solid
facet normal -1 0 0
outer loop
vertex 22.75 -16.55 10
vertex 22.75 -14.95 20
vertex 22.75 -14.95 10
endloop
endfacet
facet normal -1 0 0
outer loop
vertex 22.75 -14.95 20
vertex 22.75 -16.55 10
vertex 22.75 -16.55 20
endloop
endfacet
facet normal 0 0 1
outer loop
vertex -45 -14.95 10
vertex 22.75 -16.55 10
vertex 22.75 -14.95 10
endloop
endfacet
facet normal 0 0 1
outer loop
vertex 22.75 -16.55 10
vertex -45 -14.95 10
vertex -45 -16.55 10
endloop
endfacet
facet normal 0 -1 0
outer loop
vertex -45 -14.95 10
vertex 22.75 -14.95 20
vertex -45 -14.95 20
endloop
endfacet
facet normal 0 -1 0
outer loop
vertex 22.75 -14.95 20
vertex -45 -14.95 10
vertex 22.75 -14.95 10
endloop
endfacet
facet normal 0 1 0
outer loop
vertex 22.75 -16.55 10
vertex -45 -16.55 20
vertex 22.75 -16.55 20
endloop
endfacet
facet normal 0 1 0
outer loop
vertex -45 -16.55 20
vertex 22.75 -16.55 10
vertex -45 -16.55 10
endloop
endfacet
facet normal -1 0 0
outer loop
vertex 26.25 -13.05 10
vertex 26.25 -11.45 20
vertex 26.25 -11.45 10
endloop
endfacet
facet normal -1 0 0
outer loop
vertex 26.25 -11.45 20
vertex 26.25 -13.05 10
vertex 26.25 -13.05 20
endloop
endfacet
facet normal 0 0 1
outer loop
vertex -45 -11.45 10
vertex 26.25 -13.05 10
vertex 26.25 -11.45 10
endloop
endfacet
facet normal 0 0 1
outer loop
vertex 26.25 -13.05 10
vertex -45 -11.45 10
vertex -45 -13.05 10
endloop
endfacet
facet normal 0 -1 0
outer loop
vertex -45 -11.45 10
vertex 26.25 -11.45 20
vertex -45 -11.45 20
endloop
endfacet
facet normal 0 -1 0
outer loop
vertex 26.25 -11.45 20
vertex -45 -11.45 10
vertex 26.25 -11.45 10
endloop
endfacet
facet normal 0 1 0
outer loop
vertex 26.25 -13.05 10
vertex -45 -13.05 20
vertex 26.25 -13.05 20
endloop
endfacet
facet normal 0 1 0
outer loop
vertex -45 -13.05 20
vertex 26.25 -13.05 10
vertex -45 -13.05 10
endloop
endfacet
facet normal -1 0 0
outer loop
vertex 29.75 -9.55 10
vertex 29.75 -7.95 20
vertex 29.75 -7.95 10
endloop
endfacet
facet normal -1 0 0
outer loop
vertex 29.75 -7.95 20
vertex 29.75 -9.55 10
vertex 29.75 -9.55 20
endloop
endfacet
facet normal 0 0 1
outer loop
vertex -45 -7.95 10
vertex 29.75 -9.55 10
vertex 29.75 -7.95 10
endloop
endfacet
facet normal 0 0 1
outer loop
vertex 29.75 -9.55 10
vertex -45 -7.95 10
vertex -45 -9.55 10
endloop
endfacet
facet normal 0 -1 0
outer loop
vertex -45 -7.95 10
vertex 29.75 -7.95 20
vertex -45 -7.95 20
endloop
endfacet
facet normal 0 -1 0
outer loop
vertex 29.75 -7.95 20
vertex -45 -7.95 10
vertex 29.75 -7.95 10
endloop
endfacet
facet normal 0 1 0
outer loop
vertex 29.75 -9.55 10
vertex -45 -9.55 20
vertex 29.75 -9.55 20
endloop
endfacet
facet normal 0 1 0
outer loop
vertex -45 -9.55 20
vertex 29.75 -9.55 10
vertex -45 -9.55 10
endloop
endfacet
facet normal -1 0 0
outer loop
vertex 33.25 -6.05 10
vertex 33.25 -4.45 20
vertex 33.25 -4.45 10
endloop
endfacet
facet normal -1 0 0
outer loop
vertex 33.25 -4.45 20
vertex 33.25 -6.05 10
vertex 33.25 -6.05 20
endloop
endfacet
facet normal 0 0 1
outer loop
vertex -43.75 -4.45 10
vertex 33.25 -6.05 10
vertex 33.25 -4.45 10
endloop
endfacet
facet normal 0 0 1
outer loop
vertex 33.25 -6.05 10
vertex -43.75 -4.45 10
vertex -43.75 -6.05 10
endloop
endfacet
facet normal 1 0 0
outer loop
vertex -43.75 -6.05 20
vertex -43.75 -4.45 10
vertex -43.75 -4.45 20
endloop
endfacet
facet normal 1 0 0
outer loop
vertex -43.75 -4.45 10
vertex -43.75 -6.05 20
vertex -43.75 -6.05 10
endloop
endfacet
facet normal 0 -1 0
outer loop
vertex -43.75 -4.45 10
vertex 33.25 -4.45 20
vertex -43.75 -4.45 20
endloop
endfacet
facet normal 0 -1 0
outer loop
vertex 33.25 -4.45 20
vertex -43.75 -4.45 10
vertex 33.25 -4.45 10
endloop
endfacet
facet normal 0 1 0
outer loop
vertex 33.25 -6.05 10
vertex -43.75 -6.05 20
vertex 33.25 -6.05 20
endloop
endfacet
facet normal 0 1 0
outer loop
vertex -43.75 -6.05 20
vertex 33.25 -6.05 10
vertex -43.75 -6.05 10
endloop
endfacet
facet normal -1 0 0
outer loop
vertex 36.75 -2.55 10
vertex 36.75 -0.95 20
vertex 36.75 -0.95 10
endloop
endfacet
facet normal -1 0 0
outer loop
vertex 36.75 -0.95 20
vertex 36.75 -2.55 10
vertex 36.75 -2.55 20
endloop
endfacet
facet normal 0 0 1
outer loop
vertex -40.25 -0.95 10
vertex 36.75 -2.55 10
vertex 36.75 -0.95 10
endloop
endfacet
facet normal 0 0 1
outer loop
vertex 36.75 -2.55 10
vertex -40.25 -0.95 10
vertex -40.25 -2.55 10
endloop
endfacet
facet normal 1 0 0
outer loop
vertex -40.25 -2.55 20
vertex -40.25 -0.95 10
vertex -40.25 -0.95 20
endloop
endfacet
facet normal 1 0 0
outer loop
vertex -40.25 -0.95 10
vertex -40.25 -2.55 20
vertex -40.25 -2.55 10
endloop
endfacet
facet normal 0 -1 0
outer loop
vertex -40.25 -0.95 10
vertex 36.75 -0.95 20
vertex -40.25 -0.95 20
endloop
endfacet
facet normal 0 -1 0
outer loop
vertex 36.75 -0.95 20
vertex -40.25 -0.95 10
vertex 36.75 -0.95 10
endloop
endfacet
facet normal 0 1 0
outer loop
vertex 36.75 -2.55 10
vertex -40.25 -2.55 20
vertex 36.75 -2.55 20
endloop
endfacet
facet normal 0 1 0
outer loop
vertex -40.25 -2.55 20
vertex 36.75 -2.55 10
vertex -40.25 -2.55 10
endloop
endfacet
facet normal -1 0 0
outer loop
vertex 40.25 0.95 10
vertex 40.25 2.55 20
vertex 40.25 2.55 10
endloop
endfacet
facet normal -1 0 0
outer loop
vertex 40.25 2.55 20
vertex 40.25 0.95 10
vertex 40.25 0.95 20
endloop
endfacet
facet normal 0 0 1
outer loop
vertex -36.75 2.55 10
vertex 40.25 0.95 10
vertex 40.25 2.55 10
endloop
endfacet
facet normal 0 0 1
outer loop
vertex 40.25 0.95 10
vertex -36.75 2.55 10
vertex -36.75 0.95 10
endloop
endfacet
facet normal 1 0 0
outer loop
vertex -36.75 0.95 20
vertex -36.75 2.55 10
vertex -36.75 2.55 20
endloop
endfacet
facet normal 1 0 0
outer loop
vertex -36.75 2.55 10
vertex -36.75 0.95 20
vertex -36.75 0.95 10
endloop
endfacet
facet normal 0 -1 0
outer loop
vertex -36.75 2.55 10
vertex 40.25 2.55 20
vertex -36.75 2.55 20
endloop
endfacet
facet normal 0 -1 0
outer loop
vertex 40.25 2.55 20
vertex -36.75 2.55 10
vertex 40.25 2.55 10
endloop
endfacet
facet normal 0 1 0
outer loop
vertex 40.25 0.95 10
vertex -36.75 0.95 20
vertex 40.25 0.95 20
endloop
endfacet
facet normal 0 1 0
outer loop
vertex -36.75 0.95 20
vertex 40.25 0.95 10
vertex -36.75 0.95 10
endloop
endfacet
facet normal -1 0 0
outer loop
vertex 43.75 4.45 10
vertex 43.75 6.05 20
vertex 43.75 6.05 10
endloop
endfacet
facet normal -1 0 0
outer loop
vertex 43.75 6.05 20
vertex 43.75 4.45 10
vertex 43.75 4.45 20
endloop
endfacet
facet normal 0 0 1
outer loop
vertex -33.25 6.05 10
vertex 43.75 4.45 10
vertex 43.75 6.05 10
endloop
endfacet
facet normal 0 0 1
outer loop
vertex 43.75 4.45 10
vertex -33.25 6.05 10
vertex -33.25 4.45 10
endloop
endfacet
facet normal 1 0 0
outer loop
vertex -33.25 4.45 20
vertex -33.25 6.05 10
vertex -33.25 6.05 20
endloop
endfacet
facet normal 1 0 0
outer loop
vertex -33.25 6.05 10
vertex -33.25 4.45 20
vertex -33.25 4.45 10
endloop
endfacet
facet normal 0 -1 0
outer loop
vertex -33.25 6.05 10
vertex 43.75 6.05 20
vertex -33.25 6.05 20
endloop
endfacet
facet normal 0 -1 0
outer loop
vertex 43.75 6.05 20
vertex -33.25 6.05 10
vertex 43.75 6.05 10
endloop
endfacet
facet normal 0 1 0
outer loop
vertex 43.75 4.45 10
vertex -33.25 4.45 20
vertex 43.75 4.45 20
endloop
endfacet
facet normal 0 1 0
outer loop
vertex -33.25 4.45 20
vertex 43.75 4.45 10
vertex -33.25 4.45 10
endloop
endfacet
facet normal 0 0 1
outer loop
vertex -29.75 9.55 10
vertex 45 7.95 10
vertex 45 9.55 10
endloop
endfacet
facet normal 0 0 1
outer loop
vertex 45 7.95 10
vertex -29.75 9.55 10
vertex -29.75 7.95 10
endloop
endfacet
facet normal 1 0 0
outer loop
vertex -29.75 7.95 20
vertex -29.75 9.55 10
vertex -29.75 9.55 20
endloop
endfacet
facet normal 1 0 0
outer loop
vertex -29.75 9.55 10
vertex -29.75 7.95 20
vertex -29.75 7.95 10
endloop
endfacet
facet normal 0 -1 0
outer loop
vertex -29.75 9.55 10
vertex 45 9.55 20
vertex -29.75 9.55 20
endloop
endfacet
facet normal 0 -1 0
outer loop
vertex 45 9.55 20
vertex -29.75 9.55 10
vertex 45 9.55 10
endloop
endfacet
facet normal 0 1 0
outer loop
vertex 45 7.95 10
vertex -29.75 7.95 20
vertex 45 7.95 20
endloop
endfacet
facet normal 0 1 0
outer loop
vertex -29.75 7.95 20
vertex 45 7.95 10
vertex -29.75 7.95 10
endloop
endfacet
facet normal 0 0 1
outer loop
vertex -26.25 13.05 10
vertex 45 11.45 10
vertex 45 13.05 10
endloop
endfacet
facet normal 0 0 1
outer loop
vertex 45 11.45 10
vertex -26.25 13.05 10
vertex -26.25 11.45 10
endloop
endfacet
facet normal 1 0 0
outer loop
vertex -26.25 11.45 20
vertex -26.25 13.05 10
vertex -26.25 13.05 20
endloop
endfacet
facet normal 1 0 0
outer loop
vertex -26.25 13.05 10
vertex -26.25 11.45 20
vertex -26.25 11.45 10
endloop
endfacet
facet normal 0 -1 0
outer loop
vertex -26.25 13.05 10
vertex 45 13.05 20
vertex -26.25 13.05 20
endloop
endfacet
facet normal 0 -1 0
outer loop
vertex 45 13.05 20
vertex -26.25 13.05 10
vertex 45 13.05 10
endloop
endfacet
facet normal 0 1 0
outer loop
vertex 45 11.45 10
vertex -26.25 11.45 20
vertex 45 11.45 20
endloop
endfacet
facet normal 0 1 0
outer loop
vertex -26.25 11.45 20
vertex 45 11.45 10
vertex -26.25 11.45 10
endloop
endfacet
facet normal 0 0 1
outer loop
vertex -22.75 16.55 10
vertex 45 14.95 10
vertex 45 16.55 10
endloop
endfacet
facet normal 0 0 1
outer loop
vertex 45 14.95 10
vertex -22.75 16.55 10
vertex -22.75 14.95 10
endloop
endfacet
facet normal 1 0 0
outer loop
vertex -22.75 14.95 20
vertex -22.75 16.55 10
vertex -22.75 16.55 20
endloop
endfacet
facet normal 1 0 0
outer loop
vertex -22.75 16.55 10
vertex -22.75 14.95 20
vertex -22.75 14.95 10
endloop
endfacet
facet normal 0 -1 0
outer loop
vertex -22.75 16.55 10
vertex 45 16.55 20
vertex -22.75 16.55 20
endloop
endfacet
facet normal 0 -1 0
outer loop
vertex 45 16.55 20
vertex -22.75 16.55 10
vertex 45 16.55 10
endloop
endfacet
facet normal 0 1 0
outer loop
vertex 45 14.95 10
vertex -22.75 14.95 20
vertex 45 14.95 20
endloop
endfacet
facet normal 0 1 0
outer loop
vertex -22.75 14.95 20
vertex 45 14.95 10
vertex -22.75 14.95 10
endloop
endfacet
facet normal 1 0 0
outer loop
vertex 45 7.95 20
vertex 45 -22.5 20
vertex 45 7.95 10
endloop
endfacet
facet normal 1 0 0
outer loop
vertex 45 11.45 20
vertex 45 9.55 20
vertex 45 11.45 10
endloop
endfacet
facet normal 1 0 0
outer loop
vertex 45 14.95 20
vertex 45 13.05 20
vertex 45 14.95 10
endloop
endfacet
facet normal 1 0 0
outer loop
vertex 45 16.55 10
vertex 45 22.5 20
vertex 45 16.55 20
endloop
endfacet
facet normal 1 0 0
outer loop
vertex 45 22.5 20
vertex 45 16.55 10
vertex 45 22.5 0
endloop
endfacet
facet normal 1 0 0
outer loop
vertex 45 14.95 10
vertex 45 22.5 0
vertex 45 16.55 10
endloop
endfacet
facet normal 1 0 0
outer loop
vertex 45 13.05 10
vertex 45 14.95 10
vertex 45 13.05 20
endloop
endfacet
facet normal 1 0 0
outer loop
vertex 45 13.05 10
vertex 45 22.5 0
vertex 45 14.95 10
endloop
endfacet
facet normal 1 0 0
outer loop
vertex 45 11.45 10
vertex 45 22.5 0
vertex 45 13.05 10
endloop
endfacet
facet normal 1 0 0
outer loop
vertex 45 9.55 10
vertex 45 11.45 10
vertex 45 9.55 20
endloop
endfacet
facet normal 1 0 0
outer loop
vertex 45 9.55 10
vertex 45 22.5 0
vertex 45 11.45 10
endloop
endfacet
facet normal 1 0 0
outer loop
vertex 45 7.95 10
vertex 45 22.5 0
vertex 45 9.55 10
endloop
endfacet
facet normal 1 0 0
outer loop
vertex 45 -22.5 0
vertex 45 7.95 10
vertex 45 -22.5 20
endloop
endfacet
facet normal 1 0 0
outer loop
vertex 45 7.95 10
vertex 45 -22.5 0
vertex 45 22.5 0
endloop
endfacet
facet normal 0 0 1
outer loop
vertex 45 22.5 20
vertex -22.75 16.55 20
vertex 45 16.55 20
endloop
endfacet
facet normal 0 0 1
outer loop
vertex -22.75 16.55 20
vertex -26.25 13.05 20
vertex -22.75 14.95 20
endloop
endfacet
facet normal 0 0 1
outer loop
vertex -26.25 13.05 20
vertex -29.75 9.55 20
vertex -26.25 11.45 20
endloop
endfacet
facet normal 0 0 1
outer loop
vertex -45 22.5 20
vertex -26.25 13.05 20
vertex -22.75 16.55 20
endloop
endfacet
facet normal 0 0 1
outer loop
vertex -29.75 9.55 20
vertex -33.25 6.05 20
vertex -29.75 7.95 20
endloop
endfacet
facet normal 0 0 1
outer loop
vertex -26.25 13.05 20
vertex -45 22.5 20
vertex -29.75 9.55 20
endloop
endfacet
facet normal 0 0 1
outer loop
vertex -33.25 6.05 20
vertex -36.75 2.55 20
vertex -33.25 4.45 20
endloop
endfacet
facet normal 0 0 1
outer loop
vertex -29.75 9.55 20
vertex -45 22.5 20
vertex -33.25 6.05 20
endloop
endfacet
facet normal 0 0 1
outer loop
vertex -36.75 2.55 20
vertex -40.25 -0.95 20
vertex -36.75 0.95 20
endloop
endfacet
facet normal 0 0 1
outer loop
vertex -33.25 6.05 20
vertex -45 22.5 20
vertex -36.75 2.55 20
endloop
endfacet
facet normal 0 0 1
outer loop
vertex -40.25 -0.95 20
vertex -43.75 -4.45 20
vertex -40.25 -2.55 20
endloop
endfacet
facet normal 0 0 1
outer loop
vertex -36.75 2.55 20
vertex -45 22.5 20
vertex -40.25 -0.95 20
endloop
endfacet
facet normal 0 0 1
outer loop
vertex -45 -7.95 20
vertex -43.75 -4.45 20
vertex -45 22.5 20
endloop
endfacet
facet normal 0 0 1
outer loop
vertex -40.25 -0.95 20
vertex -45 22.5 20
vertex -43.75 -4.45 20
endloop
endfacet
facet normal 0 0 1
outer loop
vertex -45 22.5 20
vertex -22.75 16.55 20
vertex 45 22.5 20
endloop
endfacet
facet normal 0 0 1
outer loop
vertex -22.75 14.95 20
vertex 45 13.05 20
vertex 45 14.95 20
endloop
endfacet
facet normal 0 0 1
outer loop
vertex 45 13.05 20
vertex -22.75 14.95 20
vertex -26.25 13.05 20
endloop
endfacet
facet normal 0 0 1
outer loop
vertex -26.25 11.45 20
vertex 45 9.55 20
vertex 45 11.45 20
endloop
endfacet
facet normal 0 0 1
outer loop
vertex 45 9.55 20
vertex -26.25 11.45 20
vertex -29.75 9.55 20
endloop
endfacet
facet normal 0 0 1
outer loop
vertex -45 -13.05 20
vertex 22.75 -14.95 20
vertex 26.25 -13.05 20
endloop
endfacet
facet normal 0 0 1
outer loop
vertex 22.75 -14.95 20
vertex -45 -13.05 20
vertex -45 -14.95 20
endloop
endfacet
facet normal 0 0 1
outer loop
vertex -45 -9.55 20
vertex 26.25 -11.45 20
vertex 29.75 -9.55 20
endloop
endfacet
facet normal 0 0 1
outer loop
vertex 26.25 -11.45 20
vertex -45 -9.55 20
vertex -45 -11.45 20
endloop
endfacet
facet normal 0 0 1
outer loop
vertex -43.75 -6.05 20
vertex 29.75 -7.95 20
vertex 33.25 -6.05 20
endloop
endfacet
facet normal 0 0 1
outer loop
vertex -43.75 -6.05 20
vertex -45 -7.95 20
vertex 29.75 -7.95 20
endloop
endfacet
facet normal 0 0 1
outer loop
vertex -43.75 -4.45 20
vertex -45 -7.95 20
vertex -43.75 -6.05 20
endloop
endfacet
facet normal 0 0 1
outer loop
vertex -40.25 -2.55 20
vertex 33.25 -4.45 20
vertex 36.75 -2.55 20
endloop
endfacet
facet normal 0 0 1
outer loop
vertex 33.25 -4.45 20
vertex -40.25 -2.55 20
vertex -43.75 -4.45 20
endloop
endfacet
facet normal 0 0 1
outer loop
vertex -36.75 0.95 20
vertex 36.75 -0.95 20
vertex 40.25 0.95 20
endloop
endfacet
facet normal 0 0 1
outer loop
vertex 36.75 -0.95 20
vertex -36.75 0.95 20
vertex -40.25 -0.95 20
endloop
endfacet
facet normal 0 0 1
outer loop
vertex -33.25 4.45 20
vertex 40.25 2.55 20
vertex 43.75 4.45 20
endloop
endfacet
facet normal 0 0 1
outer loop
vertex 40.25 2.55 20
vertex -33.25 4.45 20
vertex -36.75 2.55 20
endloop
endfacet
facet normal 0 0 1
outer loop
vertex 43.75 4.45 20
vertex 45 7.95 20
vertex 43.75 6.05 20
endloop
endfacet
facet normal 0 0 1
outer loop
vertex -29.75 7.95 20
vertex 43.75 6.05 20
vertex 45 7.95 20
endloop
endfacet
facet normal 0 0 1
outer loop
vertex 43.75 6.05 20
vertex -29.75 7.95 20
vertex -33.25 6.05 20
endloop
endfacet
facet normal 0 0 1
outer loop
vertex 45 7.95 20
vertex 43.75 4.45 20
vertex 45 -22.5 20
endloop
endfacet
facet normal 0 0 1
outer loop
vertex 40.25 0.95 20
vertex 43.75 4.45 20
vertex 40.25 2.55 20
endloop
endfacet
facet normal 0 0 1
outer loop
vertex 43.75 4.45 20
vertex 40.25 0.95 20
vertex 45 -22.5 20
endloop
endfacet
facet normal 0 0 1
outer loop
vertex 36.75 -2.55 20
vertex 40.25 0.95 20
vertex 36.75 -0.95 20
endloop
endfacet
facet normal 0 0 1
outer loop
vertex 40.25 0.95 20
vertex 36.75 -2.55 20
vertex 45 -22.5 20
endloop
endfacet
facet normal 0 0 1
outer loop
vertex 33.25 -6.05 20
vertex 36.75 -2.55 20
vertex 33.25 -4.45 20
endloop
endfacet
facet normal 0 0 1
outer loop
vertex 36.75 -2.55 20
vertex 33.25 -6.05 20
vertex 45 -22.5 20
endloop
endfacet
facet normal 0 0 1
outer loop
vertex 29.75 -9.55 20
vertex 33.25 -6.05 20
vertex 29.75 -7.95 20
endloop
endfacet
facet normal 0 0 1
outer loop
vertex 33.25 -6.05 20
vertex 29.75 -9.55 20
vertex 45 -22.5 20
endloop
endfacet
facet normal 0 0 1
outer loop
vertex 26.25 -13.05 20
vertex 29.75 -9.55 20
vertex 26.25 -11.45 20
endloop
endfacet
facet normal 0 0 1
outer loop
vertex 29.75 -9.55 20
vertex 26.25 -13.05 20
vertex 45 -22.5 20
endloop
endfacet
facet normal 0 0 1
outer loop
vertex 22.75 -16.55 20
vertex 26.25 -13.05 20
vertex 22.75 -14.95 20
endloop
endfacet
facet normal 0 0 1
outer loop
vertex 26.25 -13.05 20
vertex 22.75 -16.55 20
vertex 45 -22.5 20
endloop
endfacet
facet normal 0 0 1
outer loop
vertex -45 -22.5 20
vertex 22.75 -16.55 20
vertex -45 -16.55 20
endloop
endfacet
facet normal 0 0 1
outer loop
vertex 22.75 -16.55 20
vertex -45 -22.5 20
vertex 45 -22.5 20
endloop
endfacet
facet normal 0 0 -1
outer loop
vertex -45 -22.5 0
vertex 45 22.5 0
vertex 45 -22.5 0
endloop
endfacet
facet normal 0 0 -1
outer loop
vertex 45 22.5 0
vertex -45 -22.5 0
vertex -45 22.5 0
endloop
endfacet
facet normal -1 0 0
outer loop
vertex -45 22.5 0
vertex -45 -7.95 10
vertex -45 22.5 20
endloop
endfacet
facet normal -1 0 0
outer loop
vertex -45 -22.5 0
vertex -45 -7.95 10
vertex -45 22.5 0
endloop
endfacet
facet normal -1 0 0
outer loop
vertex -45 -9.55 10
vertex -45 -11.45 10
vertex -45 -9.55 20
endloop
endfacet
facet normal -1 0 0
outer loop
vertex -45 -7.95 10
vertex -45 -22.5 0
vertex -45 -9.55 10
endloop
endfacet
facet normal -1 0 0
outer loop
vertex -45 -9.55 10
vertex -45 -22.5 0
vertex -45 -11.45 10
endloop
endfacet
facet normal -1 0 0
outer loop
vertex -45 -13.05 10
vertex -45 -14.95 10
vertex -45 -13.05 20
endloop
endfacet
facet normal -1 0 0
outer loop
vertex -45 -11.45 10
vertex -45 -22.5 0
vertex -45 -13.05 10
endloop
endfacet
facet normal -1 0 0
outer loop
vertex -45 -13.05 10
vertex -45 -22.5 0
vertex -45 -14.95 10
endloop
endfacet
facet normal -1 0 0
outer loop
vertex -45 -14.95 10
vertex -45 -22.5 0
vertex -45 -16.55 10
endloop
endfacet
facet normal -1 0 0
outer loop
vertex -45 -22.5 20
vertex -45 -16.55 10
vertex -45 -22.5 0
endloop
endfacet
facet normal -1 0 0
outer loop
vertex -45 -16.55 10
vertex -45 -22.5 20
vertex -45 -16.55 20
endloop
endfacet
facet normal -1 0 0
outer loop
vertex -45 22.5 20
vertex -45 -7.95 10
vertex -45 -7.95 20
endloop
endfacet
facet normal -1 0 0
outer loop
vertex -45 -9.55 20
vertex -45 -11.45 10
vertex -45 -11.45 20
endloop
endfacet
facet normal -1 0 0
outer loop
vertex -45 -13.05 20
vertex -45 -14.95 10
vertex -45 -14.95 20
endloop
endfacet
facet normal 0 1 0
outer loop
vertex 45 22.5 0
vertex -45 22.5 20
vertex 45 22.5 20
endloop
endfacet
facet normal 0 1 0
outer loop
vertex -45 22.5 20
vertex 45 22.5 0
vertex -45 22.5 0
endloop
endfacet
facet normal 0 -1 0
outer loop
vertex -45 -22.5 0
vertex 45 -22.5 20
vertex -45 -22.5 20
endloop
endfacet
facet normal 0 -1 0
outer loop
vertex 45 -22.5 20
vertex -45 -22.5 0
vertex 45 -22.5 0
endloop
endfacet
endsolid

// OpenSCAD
// Slide drying rack - solid base with 10 upright slide slots
// Units: mm. Print orientation: base on XY plane, builds +Z.

// ---------- Block ----------
block_l = 90;    // block length (X)
block_w = 45;    // block width (Y)
block_h = 20;    // block height (Z)

// ---------- Slots ----------
slot_count = 10;     // number of slide slots
slot_len   = 77;     // slot length along X
slot_w     = 1.6;    // slot width along Y
slot_depth = 10;     // slot depth into block from top face
slot_pitch = 3.5;    // centre-to-centre spacing along Y
cut_extra  = 0.5;    // overshoot past cut faces to avoid coplanar faces

$fn = 64;

// Slot group centred on block in X and Y
slot_x0 = -(slot_count - 1) * slot_pitch / 2;
slot_y0 = -(slot_count - 1) * slot_pitch / 2;

difference() {
    // Base block
    translate([-block_l / 2, -block_w / 2, 0])
        cube([block_l, block_w, block_h]);

    // Parallel slots, open at the top
    for (i = [0 : slot_count - 1]) {
        translate([slot_x0 + i * slot_pitch - slot_len / 2,
                   slot_y0 + i * slot_pitch - slot_w / 2,
                   block_h - slot_depth])
            cube([slot_len, slot_w, slot_depth + cut_extra]);
    }
}
